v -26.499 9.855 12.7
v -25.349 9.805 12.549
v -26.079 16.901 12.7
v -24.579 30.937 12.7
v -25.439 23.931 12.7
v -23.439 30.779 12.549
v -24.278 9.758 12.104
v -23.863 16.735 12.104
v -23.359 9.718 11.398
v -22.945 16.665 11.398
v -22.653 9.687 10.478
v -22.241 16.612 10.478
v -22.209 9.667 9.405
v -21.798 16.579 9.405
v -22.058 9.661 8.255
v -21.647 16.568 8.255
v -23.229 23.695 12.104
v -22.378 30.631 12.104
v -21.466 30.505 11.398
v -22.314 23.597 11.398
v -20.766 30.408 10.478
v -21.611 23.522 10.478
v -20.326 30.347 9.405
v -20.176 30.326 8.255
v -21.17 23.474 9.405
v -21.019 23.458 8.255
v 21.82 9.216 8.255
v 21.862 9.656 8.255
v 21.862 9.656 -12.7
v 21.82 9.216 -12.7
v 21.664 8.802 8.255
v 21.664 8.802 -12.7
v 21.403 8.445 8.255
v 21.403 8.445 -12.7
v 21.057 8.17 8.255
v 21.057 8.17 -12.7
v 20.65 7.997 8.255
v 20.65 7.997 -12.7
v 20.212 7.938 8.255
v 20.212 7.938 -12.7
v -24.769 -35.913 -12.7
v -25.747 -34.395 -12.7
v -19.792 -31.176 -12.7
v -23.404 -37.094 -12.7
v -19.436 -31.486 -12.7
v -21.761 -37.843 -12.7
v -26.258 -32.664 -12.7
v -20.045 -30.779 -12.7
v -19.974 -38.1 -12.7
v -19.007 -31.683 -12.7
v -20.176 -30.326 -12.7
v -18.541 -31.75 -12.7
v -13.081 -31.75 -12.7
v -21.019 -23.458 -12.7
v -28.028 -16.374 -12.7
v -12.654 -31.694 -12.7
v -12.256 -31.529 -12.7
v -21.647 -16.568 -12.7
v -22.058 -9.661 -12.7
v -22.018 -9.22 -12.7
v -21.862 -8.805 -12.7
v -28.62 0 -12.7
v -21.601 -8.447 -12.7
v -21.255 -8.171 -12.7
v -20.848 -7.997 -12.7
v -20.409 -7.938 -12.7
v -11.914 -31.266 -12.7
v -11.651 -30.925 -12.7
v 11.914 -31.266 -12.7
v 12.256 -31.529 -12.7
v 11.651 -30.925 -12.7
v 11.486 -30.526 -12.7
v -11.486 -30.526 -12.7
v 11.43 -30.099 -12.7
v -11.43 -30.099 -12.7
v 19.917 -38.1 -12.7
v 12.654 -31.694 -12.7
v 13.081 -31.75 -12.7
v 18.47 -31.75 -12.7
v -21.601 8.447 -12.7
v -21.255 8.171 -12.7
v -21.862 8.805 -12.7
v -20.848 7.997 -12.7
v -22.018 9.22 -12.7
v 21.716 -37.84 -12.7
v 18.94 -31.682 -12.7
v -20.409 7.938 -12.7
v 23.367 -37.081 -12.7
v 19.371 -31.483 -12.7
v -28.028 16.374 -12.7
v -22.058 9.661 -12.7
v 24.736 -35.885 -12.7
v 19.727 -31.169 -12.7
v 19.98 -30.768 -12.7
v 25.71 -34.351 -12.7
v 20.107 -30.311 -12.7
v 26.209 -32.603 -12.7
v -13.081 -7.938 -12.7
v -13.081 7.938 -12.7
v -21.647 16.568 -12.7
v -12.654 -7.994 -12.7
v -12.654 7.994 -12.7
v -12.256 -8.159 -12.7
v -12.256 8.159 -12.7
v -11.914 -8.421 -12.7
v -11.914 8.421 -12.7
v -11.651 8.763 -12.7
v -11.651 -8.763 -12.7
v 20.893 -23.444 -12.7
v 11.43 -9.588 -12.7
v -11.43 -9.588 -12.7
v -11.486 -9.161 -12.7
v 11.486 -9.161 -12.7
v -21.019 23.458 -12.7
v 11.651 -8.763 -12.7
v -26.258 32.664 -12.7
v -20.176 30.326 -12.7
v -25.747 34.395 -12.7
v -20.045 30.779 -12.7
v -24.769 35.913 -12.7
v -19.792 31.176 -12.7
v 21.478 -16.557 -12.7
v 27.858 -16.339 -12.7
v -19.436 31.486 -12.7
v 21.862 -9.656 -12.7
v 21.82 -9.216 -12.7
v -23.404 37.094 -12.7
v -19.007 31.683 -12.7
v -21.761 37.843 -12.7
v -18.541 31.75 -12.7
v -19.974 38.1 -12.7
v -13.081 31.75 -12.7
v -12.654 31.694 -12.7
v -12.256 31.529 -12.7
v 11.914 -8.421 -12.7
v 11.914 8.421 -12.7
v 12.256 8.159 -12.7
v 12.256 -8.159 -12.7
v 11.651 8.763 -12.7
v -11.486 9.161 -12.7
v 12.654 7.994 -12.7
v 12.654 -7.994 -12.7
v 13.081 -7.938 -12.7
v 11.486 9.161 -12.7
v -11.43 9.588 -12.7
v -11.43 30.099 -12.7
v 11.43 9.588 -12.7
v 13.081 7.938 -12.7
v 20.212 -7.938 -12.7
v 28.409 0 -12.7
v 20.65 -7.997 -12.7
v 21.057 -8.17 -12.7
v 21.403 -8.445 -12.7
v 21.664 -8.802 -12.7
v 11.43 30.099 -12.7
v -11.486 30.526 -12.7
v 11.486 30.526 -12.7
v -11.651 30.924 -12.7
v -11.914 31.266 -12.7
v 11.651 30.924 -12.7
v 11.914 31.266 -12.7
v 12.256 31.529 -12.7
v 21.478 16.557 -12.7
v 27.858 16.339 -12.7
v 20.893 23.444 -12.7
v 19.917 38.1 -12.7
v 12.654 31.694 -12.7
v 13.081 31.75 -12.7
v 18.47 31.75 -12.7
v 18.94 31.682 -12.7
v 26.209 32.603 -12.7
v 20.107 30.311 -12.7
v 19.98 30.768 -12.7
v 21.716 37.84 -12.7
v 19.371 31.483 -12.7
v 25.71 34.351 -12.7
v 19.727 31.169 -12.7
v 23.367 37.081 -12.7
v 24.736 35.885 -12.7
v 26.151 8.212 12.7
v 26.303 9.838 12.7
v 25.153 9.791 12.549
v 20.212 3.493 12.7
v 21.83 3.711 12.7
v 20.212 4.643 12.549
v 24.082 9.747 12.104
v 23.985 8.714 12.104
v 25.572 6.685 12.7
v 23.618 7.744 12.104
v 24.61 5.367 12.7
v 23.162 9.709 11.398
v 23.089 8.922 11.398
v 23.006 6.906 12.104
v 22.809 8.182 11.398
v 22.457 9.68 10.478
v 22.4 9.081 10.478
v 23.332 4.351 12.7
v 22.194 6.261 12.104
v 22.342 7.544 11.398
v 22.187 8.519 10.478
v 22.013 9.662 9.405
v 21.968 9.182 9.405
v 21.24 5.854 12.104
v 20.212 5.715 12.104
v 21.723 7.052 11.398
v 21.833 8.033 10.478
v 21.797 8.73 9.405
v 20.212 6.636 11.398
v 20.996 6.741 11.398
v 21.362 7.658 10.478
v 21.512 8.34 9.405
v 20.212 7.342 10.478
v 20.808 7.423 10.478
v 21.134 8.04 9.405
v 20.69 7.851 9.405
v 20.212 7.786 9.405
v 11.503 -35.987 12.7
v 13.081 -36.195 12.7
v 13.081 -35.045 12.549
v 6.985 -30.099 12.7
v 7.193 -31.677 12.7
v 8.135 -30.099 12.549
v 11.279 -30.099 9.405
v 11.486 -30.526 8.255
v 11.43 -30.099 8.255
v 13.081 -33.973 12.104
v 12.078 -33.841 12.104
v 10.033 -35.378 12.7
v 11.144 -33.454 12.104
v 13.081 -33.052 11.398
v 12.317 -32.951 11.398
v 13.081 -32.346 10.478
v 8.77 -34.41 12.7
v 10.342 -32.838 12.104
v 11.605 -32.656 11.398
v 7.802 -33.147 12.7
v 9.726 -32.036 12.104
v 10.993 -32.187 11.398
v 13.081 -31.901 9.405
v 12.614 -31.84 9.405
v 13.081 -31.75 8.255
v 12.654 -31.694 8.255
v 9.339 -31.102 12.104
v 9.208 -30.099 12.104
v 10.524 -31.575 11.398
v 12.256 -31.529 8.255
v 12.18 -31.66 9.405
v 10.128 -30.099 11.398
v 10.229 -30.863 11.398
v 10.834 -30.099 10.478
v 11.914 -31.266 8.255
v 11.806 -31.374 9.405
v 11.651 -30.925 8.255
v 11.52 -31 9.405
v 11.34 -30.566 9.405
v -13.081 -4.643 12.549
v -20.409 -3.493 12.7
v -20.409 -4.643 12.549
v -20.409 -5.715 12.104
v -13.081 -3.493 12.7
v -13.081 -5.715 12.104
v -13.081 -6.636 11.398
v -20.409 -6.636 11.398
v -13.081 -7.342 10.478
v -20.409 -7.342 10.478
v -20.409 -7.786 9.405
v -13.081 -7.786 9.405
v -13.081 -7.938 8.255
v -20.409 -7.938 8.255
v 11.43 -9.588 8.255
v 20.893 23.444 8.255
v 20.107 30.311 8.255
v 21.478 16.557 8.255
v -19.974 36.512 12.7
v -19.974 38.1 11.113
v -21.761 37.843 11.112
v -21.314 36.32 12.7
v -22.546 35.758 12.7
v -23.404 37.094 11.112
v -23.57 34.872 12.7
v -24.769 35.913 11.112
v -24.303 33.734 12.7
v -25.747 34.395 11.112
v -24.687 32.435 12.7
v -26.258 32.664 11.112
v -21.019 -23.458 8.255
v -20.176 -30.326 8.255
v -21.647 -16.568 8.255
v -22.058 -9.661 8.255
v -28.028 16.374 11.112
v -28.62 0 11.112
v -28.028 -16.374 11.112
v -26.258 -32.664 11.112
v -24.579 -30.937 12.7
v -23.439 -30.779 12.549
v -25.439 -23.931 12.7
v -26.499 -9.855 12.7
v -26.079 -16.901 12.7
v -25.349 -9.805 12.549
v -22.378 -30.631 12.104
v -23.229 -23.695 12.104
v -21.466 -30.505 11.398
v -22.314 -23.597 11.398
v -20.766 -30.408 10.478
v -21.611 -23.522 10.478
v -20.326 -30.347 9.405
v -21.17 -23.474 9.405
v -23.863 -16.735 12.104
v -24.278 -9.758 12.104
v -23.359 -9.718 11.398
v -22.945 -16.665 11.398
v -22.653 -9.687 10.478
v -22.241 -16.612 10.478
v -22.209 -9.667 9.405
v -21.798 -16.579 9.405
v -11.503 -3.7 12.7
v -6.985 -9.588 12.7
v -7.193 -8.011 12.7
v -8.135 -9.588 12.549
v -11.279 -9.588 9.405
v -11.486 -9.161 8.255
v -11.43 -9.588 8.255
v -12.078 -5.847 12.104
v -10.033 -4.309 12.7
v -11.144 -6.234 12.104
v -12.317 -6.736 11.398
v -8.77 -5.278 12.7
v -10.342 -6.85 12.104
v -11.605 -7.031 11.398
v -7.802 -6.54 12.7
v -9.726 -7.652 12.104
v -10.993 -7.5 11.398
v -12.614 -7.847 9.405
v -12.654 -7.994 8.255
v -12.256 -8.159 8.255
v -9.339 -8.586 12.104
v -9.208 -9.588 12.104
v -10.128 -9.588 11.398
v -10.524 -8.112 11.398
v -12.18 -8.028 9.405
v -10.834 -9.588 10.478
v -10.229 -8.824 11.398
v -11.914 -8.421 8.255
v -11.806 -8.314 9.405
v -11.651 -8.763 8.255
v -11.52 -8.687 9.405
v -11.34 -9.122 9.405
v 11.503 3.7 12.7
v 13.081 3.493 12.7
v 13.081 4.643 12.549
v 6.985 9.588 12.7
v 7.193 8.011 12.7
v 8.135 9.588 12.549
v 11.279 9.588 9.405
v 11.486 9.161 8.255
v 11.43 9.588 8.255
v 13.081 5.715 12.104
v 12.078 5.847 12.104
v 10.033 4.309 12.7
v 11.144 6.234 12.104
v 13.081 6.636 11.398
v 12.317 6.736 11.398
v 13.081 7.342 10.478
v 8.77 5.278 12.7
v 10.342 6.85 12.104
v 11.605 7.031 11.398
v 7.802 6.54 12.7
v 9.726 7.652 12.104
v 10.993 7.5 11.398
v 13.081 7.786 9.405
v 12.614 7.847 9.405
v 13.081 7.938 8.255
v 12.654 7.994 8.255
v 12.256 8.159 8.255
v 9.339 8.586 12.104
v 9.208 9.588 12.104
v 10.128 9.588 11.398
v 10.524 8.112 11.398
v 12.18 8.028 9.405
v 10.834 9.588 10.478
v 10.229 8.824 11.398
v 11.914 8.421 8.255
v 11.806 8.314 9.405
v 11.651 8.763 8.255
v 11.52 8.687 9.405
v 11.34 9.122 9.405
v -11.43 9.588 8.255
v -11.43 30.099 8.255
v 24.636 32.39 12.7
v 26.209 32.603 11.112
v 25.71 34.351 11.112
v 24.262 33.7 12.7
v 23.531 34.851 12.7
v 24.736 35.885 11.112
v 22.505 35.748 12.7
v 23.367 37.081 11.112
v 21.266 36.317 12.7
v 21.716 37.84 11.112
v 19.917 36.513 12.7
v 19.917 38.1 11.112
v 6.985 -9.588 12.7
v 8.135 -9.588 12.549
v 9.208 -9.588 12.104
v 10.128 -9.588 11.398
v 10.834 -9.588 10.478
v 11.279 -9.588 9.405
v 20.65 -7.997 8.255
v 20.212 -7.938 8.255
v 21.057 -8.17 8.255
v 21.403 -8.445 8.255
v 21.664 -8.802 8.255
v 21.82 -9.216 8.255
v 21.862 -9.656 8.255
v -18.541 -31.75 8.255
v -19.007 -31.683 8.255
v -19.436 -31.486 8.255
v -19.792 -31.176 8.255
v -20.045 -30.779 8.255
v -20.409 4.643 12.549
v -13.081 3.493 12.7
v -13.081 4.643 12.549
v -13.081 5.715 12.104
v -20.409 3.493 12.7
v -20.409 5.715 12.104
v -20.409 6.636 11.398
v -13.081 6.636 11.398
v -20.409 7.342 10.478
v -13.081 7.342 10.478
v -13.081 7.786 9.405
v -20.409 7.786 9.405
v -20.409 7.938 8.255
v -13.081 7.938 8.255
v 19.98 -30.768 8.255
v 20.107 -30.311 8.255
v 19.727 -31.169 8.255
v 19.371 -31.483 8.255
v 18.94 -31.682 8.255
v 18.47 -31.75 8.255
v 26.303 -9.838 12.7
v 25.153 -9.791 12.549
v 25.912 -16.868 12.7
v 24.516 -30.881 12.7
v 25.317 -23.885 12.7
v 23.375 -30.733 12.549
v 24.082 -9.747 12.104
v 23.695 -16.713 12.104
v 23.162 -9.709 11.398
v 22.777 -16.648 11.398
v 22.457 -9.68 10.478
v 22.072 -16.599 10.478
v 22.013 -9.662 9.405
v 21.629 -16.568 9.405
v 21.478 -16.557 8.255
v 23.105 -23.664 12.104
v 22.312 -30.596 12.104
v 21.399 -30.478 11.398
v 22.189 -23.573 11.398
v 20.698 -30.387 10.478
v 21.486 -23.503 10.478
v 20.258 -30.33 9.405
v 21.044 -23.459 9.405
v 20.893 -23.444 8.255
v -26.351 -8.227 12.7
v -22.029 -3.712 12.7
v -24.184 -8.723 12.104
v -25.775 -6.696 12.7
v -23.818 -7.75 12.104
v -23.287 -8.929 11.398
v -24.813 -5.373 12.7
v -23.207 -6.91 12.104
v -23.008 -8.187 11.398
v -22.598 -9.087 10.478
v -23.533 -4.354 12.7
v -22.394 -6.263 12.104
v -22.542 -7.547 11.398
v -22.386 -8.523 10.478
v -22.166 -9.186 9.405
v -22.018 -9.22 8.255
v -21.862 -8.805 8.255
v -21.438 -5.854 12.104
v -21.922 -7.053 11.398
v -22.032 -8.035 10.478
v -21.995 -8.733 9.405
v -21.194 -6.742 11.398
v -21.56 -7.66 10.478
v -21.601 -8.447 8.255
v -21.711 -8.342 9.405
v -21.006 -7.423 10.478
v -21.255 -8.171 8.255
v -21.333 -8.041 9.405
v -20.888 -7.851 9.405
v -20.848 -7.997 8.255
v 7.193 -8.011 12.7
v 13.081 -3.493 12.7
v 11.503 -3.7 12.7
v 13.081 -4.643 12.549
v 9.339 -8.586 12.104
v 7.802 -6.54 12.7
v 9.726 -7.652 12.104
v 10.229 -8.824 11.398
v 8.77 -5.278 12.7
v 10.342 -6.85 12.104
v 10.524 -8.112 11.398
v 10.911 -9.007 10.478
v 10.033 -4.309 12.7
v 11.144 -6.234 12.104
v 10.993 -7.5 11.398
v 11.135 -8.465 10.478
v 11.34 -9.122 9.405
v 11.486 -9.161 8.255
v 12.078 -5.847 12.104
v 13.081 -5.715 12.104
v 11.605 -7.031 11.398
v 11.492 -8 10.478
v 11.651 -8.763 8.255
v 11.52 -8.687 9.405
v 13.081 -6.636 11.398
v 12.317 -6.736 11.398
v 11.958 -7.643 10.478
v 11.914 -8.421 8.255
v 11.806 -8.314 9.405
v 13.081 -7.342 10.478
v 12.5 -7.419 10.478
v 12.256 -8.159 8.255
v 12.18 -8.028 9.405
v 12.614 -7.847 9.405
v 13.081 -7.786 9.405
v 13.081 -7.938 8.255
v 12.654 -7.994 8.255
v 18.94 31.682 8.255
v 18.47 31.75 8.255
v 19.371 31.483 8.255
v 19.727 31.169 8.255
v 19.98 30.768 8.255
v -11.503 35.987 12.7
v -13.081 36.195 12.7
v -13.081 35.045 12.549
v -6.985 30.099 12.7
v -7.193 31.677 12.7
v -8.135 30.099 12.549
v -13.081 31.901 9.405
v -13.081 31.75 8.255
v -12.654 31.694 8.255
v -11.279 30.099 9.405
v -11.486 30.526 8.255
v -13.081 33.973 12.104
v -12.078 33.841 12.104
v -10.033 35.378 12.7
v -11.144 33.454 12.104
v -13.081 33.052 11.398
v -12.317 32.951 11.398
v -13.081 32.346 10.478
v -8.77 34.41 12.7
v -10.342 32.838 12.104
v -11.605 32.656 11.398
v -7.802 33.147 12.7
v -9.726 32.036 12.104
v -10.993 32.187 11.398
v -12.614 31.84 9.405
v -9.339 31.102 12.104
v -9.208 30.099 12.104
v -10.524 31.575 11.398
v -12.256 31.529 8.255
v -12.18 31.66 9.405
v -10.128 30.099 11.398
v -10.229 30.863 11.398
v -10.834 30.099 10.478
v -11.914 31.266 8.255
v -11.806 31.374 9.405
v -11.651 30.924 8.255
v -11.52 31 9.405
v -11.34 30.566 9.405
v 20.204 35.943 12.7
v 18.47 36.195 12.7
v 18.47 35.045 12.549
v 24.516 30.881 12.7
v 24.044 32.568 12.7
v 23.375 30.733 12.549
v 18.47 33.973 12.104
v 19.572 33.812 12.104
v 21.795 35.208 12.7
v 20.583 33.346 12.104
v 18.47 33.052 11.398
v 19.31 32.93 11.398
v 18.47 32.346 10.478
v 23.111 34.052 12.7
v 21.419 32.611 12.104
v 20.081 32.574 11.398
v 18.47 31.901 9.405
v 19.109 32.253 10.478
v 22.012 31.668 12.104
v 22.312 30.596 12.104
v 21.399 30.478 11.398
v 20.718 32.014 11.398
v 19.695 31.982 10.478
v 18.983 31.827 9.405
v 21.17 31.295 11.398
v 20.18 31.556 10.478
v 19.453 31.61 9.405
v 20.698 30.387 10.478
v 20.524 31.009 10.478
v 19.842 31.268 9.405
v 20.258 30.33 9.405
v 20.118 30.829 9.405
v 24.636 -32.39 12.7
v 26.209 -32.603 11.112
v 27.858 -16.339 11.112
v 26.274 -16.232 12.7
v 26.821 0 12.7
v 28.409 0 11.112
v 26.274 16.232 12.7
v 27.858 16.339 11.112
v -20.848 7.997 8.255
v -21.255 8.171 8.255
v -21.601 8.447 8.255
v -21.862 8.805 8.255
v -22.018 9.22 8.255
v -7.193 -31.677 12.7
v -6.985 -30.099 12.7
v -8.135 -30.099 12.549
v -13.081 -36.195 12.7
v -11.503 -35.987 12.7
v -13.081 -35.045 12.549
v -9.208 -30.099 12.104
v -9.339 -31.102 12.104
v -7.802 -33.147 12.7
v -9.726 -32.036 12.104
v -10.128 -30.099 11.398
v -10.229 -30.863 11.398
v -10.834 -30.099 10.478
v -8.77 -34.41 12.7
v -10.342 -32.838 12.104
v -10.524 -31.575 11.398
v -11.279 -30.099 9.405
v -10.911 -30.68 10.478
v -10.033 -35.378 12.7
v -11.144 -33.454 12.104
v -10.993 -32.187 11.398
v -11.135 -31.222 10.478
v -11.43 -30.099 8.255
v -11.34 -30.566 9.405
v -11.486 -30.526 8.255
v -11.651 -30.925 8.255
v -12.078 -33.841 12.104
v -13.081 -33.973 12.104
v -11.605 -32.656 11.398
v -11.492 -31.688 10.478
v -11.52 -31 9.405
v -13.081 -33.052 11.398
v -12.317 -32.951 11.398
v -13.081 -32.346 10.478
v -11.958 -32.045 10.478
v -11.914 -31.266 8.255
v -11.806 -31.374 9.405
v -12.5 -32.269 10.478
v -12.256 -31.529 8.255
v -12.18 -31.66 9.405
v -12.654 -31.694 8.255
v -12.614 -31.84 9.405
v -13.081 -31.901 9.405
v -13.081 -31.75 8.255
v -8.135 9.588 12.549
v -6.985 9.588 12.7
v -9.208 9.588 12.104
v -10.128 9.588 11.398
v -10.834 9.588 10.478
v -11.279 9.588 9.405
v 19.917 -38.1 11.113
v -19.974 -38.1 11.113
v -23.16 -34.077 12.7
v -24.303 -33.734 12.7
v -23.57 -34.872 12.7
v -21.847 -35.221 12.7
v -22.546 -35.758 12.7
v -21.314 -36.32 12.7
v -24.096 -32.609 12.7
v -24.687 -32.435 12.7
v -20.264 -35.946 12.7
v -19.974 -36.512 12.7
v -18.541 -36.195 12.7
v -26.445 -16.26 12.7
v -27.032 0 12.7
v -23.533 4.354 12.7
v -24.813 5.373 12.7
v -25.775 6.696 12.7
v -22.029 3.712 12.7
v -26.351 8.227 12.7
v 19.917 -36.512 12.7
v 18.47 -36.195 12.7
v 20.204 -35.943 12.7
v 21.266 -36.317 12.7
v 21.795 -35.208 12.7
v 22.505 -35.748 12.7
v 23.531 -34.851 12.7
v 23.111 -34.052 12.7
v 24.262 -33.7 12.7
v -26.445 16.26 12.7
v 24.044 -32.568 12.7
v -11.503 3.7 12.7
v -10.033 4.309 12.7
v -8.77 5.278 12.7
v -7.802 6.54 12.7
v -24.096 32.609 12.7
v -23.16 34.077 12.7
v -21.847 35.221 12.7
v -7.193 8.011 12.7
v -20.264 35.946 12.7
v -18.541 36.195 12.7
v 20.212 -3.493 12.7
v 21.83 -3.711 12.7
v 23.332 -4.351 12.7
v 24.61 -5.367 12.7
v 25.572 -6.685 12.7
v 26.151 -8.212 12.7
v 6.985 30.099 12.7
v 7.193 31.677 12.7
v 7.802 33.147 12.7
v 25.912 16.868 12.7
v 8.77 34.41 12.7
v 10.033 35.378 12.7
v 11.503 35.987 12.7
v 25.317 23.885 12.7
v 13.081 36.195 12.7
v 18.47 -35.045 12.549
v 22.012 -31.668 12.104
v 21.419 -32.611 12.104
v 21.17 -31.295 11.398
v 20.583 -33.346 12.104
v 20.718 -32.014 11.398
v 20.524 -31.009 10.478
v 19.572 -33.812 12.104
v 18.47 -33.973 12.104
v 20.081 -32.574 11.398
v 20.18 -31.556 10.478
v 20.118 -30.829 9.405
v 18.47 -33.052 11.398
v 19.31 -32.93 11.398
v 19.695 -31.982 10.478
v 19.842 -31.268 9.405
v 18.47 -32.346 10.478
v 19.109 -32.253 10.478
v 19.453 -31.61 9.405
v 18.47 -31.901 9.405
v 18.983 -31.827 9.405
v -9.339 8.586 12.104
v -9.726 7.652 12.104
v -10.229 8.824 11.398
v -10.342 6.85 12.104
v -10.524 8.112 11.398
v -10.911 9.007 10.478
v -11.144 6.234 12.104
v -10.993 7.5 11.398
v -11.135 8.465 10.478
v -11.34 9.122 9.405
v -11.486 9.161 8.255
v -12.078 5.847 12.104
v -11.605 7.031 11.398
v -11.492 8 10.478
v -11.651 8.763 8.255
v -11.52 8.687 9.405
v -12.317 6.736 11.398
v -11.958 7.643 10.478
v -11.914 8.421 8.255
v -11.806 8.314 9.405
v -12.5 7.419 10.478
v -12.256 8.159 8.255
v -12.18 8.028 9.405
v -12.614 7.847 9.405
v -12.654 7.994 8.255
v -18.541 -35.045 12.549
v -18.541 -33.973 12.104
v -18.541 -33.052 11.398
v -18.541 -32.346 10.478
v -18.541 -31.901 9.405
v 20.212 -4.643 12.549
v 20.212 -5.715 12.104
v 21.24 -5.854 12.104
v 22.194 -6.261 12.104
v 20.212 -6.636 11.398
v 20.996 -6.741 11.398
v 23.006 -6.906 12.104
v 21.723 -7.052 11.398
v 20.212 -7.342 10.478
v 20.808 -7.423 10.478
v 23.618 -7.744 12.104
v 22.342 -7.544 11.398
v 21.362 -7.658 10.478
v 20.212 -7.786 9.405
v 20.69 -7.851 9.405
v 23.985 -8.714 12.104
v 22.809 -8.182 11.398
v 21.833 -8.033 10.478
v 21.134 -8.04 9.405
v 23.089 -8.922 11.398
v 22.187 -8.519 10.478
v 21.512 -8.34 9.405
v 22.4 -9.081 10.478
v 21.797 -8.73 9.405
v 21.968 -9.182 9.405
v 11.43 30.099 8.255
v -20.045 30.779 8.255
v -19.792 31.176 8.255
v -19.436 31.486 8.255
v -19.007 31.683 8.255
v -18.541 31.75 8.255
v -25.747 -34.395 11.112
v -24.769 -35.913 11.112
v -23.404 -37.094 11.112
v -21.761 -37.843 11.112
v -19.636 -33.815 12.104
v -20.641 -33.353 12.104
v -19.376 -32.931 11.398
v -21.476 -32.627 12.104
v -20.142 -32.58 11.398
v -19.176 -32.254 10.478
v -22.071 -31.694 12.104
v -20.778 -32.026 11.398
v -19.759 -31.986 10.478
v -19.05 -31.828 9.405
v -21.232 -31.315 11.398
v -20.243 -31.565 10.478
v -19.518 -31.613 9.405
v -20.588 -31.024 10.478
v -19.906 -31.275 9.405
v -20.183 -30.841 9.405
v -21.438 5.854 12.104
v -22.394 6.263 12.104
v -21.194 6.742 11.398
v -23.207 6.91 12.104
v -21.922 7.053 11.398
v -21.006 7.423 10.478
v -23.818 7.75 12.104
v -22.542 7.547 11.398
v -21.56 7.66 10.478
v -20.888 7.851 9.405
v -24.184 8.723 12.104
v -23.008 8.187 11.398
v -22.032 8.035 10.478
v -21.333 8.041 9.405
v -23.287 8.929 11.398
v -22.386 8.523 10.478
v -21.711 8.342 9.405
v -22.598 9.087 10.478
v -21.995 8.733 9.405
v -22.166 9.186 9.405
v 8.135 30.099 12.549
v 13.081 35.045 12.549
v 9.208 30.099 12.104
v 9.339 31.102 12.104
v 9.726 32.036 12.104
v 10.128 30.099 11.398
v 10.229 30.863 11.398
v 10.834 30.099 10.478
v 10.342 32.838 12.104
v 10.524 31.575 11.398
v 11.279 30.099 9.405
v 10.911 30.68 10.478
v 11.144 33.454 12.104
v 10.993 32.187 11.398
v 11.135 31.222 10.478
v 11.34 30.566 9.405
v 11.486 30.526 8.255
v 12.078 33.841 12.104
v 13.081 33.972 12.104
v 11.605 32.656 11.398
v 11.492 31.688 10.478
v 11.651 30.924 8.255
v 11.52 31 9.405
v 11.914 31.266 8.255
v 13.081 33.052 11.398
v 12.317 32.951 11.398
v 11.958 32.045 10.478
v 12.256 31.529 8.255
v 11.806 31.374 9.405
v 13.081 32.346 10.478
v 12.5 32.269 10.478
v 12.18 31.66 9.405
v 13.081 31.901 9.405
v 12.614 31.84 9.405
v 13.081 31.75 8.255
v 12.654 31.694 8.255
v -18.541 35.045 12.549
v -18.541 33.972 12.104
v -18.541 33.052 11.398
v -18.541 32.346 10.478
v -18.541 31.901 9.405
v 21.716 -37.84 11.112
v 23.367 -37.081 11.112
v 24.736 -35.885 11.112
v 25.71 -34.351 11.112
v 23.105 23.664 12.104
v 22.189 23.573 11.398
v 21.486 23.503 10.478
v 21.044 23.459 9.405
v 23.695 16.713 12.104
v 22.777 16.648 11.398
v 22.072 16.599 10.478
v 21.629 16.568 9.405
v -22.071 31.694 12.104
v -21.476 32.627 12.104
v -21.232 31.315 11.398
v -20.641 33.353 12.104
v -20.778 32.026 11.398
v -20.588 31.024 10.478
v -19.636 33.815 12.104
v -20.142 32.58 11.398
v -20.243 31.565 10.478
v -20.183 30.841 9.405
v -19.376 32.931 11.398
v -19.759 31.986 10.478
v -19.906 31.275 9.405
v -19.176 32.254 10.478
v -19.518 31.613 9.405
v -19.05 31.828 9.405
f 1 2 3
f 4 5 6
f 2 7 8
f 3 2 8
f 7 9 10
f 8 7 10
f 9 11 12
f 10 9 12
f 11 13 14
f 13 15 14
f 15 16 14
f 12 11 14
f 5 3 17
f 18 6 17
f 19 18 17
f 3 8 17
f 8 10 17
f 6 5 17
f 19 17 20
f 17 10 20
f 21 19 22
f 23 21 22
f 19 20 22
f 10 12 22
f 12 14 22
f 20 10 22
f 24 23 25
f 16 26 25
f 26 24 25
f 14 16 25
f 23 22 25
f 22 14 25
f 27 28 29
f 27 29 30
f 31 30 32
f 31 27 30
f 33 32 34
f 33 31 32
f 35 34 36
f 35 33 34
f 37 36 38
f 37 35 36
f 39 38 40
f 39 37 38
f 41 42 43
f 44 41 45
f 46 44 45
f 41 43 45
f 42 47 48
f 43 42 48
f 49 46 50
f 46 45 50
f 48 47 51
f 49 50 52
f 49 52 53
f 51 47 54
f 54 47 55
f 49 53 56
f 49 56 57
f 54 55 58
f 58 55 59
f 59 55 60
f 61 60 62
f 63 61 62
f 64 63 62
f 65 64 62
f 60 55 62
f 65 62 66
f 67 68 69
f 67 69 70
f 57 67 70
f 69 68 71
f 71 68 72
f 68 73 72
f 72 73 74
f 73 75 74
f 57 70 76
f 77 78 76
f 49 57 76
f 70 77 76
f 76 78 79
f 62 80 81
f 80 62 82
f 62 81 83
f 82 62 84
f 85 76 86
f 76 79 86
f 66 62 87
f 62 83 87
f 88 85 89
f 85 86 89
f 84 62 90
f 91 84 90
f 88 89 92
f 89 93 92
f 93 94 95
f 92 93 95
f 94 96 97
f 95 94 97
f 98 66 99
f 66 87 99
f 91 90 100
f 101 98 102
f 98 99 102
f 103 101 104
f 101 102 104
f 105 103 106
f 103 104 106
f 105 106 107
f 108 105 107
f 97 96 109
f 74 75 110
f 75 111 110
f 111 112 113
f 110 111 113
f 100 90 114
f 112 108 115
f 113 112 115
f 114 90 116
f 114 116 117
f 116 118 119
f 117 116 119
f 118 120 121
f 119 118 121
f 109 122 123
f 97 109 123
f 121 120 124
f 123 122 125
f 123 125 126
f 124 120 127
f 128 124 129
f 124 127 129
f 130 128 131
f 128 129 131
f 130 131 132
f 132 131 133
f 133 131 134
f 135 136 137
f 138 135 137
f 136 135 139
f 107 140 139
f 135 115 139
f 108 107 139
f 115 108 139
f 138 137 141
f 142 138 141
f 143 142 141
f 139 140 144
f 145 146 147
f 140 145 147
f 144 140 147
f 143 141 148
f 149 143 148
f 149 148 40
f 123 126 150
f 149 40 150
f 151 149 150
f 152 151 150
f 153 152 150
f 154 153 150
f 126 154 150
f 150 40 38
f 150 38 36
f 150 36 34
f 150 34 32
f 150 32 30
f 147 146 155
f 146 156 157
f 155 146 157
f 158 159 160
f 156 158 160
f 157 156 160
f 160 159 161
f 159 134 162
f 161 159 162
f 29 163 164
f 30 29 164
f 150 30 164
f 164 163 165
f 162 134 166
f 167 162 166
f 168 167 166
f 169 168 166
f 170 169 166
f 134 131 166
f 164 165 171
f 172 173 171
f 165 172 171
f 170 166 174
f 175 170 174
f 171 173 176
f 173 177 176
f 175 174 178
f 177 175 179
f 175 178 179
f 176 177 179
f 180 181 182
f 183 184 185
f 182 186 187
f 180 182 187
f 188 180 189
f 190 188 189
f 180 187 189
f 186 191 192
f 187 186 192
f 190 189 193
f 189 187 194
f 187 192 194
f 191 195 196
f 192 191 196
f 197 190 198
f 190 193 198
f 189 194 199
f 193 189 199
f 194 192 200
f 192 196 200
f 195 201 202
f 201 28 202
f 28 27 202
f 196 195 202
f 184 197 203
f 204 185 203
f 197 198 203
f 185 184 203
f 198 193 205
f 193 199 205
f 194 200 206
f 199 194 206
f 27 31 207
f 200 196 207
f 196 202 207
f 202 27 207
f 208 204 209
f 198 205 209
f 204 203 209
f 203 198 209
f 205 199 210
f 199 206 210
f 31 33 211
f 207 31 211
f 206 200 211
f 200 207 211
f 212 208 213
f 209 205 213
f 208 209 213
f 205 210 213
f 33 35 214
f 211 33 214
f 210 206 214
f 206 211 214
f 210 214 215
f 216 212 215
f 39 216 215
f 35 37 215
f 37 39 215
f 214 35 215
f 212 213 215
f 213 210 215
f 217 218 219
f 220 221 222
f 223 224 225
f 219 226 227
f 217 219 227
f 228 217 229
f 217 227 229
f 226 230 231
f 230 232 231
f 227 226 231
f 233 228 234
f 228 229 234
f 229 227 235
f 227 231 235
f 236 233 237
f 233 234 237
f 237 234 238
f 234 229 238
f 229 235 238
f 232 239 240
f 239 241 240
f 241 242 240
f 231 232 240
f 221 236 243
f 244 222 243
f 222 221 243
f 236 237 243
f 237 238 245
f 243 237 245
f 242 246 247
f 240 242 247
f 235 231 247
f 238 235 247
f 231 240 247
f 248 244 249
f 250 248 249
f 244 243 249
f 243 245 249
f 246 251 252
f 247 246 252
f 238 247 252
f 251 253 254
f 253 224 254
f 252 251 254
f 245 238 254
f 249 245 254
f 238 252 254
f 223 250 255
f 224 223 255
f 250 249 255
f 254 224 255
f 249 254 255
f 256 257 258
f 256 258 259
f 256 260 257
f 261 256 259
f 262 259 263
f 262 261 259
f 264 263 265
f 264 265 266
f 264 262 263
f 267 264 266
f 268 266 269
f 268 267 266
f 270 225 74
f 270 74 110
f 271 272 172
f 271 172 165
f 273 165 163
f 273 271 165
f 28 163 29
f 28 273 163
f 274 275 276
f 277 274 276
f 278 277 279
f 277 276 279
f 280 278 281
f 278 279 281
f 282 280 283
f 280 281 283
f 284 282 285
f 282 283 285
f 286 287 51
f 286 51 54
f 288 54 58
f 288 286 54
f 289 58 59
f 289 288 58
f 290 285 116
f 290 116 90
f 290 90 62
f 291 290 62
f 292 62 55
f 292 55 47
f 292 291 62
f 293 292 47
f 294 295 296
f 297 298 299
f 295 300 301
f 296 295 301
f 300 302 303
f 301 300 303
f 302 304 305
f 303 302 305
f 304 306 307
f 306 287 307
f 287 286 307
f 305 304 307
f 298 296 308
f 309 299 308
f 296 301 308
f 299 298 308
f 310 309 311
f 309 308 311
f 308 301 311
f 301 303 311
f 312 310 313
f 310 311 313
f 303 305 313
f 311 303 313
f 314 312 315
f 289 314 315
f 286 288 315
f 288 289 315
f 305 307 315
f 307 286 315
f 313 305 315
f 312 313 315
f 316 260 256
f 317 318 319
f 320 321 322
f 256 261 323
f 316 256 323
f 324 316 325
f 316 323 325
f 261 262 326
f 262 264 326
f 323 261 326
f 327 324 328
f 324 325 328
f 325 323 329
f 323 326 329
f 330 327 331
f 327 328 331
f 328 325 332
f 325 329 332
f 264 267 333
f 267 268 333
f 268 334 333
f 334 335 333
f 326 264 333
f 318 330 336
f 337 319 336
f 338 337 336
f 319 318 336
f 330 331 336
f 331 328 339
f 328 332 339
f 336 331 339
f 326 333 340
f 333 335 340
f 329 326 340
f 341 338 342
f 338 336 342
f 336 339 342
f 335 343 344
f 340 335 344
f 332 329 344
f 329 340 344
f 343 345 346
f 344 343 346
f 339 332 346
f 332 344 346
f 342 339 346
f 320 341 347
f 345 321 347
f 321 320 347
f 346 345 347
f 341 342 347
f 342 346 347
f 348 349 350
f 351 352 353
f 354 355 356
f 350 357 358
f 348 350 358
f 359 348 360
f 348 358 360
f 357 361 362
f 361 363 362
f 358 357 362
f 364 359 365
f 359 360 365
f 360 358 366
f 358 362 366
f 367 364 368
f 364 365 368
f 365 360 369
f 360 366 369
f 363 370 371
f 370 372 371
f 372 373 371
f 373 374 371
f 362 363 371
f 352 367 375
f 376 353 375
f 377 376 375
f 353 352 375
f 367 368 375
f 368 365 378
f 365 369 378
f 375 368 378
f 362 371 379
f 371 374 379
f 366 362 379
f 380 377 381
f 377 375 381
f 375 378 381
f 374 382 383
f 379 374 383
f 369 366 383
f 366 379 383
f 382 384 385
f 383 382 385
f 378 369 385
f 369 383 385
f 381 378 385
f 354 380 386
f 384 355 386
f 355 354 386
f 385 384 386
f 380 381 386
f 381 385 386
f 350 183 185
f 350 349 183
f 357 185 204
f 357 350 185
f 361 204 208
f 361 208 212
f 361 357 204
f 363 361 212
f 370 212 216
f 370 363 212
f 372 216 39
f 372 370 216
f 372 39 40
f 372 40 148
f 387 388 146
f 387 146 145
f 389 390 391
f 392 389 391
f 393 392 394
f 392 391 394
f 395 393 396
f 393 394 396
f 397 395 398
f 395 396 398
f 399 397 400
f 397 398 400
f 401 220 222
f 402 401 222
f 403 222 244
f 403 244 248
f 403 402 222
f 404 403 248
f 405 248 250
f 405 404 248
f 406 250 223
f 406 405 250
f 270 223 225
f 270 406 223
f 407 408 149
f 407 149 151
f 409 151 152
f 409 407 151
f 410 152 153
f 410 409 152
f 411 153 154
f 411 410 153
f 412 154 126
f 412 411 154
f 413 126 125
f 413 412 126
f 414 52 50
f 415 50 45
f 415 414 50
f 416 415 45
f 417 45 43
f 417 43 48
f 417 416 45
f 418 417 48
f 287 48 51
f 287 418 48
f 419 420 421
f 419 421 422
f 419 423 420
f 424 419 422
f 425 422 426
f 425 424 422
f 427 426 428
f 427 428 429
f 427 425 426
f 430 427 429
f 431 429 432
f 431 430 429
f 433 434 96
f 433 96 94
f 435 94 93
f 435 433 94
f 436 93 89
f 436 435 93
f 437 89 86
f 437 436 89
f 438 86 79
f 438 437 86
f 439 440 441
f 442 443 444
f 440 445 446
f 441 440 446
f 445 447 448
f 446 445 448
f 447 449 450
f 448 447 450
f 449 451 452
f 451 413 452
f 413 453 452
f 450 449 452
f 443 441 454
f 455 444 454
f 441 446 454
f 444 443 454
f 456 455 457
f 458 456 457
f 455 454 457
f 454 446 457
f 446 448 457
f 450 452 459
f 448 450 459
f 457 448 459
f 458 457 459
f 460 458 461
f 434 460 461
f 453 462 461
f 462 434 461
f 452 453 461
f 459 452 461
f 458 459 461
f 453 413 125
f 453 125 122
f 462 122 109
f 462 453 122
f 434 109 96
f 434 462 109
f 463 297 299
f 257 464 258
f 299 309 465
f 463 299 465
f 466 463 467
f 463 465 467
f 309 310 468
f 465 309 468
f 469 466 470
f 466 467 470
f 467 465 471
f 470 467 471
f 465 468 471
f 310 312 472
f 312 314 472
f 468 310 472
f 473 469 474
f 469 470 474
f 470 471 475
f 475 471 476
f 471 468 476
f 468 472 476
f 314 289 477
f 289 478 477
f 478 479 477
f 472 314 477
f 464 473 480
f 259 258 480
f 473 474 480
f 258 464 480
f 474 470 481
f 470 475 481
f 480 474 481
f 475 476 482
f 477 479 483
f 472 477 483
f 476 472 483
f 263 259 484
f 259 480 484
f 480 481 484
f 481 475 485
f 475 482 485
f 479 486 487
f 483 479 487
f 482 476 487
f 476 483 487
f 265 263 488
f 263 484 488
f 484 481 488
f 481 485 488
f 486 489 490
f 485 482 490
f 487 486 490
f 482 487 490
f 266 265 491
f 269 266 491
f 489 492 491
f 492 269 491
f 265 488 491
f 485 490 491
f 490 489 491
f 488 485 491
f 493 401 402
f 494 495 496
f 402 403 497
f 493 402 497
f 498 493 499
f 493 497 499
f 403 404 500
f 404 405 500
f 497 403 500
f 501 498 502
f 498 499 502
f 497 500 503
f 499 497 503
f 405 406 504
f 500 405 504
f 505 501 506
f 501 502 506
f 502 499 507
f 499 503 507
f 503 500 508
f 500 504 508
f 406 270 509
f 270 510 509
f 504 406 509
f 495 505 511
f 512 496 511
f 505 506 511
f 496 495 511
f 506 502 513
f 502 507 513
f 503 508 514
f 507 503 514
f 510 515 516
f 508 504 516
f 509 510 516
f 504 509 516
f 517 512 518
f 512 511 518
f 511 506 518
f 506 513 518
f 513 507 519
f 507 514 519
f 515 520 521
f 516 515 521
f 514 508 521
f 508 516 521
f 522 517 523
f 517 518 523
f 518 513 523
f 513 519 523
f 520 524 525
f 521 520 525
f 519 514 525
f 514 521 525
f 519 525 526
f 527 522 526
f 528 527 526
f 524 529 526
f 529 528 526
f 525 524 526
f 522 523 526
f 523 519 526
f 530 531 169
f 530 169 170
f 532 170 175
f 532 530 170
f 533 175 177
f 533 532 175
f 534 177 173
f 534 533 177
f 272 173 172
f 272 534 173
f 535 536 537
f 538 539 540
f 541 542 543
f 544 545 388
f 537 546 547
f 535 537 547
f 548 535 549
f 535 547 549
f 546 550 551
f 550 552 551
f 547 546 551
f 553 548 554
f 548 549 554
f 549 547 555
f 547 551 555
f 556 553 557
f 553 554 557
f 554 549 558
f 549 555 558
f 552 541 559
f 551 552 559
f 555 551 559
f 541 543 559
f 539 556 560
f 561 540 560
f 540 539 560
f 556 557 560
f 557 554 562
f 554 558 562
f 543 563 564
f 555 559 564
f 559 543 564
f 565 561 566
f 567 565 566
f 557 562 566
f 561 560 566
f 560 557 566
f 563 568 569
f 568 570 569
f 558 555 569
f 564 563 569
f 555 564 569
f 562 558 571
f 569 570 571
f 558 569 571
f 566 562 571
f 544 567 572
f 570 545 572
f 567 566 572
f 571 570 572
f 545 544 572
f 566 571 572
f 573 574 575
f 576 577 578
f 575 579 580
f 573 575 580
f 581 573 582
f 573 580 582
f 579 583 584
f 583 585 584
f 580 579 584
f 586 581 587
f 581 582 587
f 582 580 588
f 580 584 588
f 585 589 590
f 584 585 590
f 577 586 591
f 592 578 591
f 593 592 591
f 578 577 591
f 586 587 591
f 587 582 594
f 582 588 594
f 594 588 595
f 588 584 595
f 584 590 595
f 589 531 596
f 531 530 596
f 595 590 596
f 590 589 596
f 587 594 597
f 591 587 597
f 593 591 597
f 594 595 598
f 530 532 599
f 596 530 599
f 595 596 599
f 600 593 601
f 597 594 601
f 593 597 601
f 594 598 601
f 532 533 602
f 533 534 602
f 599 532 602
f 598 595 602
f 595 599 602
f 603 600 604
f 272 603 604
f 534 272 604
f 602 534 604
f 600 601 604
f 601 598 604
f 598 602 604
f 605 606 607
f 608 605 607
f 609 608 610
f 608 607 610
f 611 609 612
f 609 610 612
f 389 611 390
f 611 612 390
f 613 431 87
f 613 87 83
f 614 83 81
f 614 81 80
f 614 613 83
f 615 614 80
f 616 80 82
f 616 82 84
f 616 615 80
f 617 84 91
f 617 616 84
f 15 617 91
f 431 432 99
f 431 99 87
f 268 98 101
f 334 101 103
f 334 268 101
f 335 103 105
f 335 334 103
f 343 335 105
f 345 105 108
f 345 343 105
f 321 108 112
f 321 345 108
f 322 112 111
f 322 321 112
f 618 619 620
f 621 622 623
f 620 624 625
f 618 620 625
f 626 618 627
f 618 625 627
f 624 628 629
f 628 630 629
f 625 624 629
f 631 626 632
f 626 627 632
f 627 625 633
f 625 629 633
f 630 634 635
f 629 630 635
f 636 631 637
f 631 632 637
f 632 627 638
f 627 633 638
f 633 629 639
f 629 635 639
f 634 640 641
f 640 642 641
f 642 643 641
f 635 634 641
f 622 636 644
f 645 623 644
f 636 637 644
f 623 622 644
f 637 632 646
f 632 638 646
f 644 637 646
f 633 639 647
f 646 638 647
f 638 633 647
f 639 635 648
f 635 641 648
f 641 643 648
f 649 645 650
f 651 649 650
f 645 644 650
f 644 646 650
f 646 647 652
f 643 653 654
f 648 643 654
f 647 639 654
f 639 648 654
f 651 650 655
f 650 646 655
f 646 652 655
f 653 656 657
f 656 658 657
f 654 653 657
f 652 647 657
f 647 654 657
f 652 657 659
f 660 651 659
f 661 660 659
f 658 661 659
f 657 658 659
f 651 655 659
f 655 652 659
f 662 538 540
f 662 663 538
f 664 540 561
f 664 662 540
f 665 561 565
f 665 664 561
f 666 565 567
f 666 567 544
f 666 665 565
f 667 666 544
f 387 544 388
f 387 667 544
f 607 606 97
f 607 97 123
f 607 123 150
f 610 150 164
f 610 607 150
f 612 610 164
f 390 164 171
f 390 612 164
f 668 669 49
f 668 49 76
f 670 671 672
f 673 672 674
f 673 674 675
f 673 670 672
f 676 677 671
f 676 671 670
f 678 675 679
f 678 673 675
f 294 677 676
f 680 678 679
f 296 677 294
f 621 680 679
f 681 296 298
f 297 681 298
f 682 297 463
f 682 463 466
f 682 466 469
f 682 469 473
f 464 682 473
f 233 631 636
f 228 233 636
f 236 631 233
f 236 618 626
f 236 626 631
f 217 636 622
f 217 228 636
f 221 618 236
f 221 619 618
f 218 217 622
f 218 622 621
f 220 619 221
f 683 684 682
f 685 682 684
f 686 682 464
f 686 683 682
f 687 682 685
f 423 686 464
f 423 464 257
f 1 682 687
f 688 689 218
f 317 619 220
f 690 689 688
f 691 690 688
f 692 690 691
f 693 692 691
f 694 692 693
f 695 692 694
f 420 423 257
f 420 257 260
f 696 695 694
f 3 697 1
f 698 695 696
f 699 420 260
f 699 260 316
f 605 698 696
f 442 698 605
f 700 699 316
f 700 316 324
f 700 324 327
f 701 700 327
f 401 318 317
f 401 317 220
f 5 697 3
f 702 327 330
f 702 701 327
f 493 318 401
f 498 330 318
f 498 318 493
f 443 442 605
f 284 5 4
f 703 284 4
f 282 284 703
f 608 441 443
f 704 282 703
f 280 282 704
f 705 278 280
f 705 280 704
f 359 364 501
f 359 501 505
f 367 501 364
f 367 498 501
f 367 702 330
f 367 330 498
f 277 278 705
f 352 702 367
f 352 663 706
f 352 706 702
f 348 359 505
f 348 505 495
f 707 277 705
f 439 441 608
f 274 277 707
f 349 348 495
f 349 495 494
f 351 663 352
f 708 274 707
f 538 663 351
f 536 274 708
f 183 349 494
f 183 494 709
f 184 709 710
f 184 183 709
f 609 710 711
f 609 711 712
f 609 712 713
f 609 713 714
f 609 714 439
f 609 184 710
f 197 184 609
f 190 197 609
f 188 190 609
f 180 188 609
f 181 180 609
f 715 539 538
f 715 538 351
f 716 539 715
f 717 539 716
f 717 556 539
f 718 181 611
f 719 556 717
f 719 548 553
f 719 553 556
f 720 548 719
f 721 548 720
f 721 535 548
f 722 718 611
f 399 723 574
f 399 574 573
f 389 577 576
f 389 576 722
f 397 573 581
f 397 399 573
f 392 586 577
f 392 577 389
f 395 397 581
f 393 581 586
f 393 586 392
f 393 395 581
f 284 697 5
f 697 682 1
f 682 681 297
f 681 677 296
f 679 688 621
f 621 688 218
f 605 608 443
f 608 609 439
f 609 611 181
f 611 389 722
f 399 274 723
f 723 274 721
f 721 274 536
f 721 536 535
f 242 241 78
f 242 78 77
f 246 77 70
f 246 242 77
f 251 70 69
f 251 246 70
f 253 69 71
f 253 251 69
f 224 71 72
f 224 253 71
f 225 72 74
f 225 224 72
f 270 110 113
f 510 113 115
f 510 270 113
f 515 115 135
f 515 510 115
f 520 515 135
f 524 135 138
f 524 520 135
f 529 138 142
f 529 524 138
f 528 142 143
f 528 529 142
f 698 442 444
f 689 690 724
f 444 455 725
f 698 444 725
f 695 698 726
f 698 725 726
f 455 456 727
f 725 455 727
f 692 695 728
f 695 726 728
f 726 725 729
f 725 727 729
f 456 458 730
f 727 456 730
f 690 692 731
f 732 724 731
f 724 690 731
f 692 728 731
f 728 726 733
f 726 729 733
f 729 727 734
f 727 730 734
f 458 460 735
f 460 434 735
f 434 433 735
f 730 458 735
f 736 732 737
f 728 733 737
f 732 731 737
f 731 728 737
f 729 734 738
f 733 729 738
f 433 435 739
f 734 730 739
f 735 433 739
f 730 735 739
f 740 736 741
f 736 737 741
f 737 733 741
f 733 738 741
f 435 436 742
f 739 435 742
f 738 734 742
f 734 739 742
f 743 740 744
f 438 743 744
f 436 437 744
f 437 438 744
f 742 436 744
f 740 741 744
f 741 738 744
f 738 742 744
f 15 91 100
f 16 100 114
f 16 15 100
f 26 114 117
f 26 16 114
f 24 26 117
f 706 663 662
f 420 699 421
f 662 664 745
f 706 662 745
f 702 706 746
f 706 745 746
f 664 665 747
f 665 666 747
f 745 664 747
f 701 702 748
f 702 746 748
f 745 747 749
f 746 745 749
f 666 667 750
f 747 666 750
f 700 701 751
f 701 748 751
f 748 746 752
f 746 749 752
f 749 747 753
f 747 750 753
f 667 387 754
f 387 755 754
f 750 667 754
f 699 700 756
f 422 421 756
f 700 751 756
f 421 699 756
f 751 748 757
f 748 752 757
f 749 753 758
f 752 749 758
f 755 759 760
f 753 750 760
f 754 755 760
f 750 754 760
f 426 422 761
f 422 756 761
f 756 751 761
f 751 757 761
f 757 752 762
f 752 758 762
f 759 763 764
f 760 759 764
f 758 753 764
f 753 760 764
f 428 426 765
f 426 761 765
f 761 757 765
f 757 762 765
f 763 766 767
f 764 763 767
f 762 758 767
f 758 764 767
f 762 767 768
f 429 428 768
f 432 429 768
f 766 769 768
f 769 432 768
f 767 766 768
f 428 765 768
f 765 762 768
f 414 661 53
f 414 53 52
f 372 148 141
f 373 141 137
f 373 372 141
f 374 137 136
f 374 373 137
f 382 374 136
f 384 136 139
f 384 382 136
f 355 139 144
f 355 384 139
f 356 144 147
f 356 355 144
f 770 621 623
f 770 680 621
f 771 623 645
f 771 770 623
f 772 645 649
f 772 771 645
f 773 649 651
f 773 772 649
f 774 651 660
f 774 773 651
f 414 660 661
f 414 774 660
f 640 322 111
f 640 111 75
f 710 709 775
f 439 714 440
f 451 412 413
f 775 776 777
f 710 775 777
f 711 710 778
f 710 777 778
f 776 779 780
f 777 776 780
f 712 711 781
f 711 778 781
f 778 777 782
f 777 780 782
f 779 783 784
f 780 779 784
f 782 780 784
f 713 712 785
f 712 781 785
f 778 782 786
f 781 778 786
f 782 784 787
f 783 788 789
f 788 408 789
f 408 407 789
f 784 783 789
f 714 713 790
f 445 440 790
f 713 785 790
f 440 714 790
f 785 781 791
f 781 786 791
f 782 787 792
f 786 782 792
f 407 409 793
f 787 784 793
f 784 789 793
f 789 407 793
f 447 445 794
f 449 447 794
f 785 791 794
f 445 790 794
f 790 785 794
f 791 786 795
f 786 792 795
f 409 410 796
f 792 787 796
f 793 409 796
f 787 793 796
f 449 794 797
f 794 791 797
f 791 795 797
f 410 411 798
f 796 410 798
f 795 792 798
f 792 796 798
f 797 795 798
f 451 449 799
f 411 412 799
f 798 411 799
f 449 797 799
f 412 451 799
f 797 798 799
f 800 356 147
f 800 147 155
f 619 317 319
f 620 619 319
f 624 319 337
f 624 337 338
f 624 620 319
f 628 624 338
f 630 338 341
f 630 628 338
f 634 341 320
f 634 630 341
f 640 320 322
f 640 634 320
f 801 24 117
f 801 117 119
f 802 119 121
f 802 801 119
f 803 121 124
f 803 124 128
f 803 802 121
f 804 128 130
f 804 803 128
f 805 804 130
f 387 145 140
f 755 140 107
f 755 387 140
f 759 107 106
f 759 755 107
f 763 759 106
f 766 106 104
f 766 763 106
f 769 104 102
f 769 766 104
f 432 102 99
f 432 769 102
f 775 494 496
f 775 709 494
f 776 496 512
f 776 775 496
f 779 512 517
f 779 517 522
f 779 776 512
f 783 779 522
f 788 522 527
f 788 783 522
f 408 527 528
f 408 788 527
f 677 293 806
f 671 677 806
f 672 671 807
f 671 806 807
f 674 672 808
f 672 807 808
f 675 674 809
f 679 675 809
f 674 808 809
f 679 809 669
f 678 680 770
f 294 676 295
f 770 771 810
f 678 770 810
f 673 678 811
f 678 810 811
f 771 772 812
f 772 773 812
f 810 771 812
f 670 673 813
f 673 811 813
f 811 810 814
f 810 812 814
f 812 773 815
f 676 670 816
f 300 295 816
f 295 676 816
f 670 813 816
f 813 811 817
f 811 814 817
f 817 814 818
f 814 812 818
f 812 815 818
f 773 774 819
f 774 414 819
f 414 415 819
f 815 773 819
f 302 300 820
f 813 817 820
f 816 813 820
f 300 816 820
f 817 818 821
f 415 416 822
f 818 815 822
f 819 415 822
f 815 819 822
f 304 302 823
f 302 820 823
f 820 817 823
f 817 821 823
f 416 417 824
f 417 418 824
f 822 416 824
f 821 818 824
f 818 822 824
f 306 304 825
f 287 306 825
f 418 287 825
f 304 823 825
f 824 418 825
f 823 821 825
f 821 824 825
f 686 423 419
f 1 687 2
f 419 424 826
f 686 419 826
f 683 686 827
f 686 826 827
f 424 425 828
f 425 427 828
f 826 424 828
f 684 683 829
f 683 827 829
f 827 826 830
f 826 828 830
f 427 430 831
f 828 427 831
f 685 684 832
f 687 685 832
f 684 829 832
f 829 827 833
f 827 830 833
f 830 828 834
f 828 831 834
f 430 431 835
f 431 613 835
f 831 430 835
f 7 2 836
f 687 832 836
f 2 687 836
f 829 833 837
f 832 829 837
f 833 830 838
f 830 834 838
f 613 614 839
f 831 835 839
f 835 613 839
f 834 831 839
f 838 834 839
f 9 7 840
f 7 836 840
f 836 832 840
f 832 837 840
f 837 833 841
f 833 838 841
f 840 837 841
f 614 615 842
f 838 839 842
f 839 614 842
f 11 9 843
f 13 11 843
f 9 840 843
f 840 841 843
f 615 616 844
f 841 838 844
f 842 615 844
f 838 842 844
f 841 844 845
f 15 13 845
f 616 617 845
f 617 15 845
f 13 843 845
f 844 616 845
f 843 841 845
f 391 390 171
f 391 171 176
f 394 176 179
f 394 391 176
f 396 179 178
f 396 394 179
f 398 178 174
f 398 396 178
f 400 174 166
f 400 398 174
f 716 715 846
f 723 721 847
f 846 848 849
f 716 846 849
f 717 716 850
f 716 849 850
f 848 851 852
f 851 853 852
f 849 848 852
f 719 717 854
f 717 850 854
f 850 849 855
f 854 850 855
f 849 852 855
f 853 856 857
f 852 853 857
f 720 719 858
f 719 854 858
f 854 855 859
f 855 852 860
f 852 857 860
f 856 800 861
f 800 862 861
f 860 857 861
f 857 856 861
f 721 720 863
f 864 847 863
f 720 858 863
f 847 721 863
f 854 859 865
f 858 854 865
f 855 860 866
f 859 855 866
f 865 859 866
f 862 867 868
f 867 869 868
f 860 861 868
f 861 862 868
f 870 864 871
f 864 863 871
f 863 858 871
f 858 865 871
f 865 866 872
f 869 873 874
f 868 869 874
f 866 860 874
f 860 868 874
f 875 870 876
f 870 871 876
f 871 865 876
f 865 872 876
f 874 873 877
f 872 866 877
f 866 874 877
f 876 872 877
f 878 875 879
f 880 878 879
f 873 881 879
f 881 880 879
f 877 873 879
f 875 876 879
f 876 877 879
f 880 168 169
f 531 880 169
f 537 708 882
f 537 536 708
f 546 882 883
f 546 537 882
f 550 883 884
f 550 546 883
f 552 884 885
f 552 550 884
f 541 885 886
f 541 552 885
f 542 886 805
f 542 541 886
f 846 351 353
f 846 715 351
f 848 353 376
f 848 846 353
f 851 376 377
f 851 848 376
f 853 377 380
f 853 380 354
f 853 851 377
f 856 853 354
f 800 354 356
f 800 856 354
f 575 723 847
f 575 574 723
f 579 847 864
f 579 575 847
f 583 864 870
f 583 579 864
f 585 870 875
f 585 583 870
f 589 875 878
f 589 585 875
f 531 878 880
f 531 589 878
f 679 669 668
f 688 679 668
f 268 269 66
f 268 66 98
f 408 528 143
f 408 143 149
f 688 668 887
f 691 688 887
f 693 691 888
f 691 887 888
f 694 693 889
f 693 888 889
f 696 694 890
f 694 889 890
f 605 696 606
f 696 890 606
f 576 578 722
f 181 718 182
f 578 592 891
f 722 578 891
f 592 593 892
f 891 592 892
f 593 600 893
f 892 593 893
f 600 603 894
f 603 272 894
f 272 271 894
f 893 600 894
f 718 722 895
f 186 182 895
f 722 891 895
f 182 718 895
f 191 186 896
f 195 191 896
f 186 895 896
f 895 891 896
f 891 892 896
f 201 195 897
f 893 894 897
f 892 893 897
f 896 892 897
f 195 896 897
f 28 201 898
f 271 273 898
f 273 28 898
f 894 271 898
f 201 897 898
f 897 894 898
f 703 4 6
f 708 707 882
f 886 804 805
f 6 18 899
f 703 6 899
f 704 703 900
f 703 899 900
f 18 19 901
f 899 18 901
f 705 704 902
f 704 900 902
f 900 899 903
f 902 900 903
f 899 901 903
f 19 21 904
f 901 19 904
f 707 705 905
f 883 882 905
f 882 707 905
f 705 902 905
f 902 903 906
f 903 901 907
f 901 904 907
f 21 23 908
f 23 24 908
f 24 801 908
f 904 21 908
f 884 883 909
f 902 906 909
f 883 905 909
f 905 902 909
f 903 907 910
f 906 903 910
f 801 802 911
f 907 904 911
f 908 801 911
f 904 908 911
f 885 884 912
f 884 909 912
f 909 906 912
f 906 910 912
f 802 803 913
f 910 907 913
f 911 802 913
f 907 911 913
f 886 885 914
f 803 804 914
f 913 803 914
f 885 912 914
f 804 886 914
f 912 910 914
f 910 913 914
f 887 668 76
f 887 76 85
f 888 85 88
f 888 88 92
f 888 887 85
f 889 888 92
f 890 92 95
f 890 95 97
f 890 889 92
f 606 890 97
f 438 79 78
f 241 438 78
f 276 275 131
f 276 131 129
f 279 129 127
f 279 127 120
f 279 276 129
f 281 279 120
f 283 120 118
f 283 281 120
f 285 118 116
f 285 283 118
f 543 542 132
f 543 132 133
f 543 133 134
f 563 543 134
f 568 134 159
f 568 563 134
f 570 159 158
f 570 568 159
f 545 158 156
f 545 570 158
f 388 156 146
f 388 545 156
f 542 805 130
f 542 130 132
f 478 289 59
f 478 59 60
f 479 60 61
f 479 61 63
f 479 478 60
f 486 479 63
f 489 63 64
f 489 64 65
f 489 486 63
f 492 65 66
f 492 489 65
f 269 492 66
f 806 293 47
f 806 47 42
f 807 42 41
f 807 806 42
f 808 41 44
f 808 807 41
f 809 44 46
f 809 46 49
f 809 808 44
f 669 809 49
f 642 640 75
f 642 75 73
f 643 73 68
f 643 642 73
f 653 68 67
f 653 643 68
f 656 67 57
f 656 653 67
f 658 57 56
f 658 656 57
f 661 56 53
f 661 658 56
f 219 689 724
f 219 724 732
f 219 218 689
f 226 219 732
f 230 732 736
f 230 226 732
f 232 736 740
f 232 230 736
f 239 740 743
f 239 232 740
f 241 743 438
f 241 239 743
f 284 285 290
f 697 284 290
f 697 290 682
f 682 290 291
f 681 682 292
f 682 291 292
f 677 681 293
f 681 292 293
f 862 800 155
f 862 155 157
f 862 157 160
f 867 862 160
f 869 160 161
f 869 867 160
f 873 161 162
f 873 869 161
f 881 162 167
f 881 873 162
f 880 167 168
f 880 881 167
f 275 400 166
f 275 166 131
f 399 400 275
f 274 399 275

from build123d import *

# Parameters (mm, degrees)
F1_DEPTH = 12.7
F2_R     = 4.445
F3_SIZE  = 1.5875


with BuildPart() as f1:
    # F0 (on Top) → F1 (new body, symmetric)
    with BuildSketch(Plane.XY):
        with BuildLine():
            ThreePointArc((26.209303, 32.602941), (24.094546, 36.53219), (19.916848, 38.1))
            Line((19.916848, 38.1), (-19.973807, 38.1))
            ThreePointArc((-19.973807, 38.1), (-24.128411, 36.552266), (-26.257749, 32.663547))
            ThreePointArc((-26.257749, 32.663547), (-28.619616, 0), (-26.257749, -32.663547))
            ThreePointArc((-26.257749, -32.663547), (-24.128411, -36.552266), (-19.973807, -38.1))
            Line((-19.973807, -38.1), (19.916848, -38.1))
            ThreePointArc((19.916848, -38.1), (24.094546, -36.53219), (26.209303, -32.602941))
            ThreePointArc((26.209303, -32.602941), (28.408907, 0), (26.209303, 32.602941))
        make_face()
        with BuildLine():
            ThreePointArc((-20.176107, -30.325869), (-21.360101, -20.015452), (-22.058065, -9.660772))
            ThreePointArc((-22.058065, -9.660772), (-21.601359, -8.446905), (-20.408647, -7.9375))
            Line((-20.408647, -7.9375), (-13.081, -7.9375))
            ThreePointArc((-13.081, -7.9375), (-11.913567, -8.421067), (-11.43, -9.5885))
            Line((-11.43, -9.5885), (-11.43, -30.099001))
            ThreePointArc((-11.43, -30.099001), (-11.913567, -31.266434), (-13.081, -31.750001))
            Line((-13.081, -31.750001), (-18.540769, -31.750001))
            ThreePointArc((-18.540769, -31.750001), (-19.625029, -31.344063), (-20.176107, -30.325869))
        make_face(mode=Mode.SUBTRACT)
        with BuildLine():
            ThreePointArc((20.107444, -30.310712), (19.56009, -31.339028), (18.470075, -31.750001))
            Line((18.470075, -31.750001), (13.081, -31.750001))
            ThreePointArc((13.081, -31.750001), (11.913567, -31.266434), (11.43, -30.099001))
            Line((11.43, -30.099001), (11.43, -9.5885))
            ThreePointArc((11.43, -9.5885), (11.913567, -8.421067), (13.081, -7.9375))
            Line((13.081, -7.9375), (20.211979, -7.9375))
            ThreePointArc((20.211979, -7.9375), (21.403018, -8.44516), (21.861601, -9.655944))
            ThreePointArc((21.861601, -9.655944), (21.21105, -20.002567), (20.107444, -30.310712))
        make_face(mode=Mode.SUBTRACT)
        with BuildLine():
            ThreePointArc((-22.058065, 9.660772), (-21.360101, 20.015452), (-20.176107, 30.325868))
            ThreePointArc((-20.176107, 30.325868), (-19.625029, 31.344062), (-18.540769, 31.75))
            Line((-18.540769, 31.75), (-13.081, 31.75))
            ThreePointArc((-13.081, 31.75), (-11.913567, 31.266433), (-11.43, 30.099))
            Line((-11.43, 30.099), (-11.43, 9.5885))
            ThreePointArc((-11.43, 9.5885), (-11.913567, 8.421067), (-13.081, 7.9375))
            Line((-13.081, 7.9375), (-20.408647, 7.9375))
            ThreePointArc((-20.408647, 7.9375), (-21.601359, 8.446905), (-22.058065, 9.660772))
        make_face(mode=Mode.SUBTRACT)
        with BuildLine():
            Line((13.081, 31.75), (18.470075, 31.75))
            ThreePointArc((18.470075, 31.75), (19.56009, 31.339028), (20.107444, 30.310712))
            ThreePointArc((20.107444, 30.310712), (21.21105, 20.002566), (21.861601, 9.655944))
            ThreePointArc((21.861601, 9.655944), (21.403018, 8.44516), (20.211979, 7.9375))
            Line((20.211979, 7.9375), (13.081, 7.9375))
            ThreePointArc((13.081, 7.9375), (11.913567, 8.421067), (11.43, 9.5885))
            Line((11.43, 9.5885), (11.43, 30.099))
            ThreePointArc((11.43, 30.099), (11.913567, 31.266433), (13.081, 31.75))
        make_face(mode=Mode.SUBTRACT)
    extrude(amount=F1_DEPTH, both=True)

    # F2
    f2_edges = [f1.edges().sort_by_distance(p)[0] for p in [
        (11.43, -19.84375, 12.7),
        (-11.43, -19.84375, 12.7),
        (11.43, 19.84375, 12.7),
        (-11.43, 19.84375, 12.7),
    ]]
    fillet(f2_edges, radius=F2_R)

    # F3
    f3_edges = [f1.edges().sort_by_distance(p)[0] for p in [
        (-0.028479, -38.1, 12.7),
    ]]
    chamfer(f3_edges, length=F3_SIZE)


solid = f1.part
